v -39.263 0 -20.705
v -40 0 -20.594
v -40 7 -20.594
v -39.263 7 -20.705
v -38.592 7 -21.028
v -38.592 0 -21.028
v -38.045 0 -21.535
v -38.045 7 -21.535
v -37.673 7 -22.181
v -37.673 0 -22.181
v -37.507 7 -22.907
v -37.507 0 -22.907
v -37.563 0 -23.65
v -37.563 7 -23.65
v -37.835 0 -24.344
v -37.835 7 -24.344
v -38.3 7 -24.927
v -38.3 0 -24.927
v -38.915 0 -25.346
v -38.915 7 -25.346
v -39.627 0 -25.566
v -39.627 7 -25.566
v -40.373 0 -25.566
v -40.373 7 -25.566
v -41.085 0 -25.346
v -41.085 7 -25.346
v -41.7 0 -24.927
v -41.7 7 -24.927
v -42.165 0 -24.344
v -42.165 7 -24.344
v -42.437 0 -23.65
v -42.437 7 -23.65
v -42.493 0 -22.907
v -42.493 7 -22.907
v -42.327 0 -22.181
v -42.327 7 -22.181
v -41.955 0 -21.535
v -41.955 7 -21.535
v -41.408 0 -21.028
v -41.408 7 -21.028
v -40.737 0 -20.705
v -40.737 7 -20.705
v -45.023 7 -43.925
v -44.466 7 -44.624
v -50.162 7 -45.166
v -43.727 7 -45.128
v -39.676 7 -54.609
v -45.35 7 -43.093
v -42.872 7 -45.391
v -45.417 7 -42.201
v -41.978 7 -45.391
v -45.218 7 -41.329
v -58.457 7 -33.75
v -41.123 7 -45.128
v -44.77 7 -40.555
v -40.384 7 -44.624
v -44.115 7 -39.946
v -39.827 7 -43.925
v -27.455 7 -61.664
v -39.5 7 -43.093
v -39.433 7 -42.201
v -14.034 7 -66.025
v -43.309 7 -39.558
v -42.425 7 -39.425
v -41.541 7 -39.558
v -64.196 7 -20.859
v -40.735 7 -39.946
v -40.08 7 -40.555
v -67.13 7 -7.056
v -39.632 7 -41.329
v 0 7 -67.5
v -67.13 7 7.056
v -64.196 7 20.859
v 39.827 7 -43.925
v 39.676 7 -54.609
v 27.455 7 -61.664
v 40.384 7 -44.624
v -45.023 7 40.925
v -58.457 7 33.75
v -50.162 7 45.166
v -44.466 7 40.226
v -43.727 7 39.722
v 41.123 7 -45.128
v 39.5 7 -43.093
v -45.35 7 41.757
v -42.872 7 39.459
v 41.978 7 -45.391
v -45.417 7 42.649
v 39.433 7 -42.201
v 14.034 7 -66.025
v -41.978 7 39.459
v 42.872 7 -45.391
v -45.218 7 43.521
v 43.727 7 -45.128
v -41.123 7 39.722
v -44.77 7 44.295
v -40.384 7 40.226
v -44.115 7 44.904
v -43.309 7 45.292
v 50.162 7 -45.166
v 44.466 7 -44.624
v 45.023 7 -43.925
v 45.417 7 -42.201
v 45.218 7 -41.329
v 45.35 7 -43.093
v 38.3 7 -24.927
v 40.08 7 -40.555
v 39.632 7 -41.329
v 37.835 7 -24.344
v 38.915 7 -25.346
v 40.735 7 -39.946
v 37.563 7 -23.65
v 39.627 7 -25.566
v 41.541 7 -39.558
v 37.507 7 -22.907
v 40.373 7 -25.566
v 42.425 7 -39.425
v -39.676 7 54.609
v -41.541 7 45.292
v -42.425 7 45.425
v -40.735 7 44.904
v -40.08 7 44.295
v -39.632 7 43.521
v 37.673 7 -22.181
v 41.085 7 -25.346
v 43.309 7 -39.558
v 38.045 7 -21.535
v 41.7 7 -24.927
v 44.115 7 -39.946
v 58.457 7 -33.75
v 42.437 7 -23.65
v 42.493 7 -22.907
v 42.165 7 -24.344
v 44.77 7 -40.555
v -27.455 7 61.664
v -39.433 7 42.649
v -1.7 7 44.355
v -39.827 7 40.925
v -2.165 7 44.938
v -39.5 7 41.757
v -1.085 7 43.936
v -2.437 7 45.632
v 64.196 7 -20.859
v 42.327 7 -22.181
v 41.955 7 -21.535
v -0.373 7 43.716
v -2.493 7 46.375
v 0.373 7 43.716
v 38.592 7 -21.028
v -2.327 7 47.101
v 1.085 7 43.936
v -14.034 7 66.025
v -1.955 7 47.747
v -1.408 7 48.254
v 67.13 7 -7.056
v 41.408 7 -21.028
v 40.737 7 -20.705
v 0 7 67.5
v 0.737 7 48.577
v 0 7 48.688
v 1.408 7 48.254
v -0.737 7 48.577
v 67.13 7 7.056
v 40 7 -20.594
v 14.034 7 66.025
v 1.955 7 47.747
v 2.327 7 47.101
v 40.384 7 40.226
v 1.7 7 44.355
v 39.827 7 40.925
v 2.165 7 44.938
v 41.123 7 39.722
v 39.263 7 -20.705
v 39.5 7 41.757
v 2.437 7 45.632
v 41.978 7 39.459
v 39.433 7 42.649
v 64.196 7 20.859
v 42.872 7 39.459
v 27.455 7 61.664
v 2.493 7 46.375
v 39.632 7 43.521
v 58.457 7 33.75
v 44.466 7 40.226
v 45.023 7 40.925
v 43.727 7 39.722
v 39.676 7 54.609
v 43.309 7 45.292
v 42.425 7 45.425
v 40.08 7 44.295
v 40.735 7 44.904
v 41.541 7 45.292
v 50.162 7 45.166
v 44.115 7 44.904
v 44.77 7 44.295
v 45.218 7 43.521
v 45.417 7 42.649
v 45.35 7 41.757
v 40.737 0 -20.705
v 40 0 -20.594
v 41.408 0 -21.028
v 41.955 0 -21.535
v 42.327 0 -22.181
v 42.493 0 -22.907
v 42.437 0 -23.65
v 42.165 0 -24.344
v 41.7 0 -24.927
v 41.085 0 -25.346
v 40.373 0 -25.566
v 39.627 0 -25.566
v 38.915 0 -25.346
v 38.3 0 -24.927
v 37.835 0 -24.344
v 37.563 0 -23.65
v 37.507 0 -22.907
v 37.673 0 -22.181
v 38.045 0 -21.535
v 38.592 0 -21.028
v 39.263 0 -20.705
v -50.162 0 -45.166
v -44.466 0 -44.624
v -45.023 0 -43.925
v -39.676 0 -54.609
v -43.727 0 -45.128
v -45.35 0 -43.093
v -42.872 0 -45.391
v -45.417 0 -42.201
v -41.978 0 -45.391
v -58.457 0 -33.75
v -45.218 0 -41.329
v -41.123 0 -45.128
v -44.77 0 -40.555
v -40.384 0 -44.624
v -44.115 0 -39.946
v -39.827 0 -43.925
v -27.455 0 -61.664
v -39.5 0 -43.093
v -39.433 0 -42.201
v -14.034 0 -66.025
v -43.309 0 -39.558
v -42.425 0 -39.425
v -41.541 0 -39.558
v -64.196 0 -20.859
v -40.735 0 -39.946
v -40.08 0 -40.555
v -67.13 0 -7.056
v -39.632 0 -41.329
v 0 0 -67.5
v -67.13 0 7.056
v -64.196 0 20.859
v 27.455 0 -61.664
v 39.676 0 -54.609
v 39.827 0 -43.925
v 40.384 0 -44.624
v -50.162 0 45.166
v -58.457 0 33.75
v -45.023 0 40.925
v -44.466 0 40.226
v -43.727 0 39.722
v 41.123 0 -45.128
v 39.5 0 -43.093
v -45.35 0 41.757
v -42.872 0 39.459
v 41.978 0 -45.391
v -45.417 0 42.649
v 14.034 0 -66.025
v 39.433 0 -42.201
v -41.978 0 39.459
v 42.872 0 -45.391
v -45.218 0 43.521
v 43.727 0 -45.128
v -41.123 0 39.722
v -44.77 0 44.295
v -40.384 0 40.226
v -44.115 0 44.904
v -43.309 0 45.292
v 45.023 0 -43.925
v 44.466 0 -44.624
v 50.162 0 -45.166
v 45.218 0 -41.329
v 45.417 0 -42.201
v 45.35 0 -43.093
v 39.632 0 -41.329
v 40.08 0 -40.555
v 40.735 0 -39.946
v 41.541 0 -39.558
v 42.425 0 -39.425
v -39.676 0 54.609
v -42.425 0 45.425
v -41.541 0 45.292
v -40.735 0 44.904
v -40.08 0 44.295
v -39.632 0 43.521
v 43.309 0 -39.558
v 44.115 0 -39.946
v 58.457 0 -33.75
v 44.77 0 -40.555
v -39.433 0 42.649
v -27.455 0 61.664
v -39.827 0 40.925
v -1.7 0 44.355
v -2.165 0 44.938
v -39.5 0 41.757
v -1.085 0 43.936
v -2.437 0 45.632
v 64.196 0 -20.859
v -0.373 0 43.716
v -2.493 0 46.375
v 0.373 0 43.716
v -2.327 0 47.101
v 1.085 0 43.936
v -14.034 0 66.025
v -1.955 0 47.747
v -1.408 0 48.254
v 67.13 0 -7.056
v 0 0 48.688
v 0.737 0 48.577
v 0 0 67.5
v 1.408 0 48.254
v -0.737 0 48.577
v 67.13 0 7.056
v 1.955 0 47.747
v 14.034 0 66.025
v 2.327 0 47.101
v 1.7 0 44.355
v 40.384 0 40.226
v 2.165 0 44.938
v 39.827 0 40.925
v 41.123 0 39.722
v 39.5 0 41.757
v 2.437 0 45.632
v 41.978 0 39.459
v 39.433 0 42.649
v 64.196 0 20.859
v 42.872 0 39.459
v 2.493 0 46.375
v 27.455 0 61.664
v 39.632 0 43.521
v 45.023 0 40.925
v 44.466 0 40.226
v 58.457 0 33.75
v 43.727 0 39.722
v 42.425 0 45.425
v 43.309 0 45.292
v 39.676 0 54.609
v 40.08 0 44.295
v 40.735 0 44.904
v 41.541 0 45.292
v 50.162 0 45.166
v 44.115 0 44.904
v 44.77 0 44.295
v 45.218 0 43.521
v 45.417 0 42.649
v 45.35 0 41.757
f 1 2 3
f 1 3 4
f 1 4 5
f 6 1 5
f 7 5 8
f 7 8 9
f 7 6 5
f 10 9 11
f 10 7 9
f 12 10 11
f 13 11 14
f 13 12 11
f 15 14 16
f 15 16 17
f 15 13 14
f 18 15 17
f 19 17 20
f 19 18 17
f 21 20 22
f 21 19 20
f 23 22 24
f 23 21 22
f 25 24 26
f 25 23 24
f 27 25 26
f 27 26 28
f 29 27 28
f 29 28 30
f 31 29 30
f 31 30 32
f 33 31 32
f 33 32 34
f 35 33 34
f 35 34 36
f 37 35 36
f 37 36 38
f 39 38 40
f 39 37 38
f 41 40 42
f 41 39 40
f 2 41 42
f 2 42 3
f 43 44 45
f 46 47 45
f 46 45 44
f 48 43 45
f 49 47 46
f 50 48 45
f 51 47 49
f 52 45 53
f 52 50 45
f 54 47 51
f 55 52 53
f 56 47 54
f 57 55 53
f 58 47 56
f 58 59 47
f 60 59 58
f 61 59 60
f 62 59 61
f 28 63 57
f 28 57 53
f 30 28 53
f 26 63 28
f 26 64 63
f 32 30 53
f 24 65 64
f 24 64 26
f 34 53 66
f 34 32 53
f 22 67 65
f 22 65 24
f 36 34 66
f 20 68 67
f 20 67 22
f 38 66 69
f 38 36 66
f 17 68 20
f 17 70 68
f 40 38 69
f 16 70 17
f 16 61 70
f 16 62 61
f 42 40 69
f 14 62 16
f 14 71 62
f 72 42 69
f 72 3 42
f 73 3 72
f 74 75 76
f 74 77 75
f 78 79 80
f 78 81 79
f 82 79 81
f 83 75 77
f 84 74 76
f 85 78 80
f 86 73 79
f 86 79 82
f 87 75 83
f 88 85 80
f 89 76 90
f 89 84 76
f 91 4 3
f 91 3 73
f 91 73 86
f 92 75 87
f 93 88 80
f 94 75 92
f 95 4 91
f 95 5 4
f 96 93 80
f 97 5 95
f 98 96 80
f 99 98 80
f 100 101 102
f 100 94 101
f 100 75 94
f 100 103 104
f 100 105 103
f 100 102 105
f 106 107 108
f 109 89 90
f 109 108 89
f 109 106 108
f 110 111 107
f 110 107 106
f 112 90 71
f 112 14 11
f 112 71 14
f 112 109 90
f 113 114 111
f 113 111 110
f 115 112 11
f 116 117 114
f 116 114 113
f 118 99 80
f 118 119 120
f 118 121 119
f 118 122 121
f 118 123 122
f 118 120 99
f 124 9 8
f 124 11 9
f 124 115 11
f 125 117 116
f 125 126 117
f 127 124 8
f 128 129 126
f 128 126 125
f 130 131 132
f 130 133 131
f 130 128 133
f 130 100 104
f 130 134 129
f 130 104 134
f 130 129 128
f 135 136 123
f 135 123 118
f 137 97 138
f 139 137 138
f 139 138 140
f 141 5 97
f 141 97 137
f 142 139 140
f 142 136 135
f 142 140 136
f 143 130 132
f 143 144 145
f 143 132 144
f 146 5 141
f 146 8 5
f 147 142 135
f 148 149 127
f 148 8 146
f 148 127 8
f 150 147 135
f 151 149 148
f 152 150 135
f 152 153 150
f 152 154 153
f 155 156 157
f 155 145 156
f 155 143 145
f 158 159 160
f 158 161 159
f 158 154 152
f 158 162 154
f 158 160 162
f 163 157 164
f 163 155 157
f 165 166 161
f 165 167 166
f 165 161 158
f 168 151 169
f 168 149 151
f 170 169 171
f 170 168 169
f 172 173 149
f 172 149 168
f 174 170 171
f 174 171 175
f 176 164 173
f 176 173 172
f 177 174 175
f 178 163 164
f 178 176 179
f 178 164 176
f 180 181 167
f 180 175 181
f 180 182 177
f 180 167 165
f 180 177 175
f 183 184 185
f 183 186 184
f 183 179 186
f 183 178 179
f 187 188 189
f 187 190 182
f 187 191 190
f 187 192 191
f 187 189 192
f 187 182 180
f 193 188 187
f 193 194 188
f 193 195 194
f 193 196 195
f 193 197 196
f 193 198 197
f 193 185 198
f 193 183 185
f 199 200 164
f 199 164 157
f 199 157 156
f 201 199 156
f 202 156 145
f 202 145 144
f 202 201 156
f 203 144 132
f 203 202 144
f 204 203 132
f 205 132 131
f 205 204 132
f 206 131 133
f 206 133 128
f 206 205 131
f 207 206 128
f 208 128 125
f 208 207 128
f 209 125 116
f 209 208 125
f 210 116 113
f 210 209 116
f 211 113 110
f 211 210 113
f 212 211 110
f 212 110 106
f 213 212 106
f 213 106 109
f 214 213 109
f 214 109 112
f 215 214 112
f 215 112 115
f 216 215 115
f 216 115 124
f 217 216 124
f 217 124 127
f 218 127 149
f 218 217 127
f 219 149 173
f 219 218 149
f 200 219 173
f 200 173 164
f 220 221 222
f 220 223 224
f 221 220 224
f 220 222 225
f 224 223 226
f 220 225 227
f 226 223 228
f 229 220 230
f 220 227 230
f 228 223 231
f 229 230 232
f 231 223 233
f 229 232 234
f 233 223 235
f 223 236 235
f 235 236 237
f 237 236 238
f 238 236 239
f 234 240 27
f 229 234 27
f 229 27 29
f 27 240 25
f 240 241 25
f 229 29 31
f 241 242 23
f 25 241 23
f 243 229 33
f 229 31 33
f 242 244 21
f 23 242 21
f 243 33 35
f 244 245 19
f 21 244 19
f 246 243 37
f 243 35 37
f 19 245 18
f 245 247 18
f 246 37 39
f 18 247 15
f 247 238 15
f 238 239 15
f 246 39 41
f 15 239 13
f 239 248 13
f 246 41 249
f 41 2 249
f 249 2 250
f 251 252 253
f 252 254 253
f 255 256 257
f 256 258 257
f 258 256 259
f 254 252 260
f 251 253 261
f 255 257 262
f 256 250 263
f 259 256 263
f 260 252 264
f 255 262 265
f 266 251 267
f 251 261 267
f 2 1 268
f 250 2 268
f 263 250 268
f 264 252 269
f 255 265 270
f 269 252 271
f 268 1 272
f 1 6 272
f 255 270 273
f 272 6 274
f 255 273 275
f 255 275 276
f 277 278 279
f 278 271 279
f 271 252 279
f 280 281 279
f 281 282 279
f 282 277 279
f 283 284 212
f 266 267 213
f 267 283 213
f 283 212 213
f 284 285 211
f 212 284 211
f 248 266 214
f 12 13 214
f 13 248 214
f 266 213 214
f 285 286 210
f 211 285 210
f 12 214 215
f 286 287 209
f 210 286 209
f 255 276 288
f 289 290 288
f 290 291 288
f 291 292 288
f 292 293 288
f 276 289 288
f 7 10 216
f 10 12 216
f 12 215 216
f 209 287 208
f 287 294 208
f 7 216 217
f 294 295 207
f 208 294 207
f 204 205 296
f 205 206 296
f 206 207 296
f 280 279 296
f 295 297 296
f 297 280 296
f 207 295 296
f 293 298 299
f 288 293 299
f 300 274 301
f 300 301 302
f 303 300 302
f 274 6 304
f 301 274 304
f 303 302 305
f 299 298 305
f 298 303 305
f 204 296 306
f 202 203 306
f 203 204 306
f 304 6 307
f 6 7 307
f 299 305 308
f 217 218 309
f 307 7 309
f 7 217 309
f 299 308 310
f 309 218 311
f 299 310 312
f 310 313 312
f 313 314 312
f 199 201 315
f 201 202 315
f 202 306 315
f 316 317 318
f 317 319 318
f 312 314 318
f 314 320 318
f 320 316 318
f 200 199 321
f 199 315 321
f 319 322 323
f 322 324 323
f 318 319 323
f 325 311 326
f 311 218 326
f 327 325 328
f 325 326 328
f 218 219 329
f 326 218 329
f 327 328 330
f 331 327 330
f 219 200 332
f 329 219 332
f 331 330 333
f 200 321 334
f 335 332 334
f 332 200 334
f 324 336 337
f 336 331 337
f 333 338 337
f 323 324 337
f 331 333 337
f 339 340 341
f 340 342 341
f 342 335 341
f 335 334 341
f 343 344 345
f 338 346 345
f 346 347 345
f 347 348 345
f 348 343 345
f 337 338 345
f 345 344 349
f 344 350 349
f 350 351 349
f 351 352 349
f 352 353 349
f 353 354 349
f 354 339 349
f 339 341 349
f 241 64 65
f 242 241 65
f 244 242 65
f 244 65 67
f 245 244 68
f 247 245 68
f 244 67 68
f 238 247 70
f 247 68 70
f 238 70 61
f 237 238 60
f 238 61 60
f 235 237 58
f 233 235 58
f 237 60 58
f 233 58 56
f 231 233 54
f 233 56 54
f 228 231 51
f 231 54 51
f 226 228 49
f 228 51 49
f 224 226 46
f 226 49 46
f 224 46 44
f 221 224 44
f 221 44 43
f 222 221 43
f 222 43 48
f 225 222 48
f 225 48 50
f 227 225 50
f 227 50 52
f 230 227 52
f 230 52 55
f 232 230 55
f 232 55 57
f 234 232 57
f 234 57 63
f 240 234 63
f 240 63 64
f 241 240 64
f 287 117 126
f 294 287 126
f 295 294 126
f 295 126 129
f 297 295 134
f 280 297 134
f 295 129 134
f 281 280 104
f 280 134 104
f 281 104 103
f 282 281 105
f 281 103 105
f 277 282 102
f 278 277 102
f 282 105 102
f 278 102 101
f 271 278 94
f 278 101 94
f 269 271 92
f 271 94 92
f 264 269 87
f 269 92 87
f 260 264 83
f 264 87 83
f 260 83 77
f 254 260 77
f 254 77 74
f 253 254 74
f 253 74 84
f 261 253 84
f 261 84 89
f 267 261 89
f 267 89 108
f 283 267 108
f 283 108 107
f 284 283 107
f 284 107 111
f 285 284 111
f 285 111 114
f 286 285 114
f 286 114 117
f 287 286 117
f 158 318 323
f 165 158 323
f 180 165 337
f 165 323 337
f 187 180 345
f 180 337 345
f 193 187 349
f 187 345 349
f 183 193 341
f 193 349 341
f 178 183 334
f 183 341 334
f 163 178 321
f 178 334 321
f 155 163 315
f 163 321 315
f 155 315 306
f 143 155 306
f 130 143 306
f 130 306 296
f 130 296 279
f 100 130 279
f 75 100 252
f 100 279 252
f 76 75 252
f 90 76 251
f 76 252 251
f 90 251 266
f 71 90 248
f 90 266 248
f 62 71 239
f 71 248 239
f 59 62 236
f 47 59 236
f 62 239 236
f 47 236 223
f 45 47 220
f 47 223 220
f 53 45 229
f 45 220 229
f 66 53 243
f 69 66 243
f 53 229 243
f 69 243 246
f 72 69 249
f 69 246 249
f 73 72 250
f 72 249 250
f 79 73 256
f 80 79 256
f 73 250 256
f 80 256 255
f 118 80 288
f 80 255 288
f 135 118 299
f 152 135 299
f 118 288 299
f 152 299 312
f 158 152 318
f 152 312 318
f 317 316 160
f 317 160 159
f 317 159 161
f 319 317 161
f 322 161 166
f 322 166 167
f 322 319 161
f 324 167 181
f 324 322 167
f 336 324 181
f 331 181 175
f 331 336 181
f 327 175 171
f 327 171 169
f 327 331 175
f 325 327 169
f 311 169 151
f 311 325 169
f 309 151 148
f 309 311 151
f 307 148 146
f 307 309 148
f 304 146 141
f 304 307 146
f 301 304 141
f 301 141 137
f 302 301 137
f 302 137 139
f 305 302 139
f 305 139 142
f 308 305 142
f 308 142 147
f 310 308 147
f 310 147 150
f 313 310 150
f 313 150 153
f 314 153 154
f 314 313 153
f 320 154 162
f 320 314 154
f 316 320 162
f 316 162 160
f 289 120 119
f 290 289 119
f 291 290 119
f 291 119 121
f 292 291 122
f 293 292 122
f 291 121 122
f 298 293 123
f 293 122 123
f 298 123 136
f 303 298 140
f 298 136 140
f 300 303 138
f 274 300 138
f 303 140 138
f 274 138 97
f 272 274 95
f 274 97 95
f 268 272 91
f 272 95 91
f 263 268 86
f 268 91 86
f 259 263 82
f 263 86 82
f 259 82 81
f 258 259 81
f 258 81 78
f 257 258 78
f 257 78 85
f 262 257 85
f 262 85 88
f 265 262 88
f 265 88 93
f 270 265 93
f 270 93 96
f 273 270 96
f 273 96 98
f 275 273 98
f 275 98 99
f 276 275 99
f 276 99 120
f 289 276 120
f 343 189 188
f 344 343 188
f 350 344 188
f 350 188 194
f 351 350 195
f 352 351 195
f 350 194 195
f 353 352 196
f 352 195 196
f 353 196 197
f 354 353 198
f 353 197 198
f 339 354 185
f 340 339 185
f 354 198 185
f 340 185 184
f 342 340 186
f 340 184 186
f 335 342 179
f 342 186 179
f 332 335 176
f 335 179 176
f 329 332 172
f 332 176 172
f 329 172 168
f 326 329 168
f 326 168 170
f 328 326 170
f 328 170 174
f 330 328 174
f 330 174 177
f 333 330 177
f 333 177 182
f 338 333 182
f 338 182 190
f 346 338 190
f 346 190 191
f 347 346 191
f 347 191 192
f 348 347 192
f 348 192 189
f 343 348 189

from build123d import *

# Parameters (mm, degrees)
SKETCH1_R           = 67.5
SKETCH1_R_2         = 2.5
BOSS_EXTRUDE1_DEPTH = 7
SKETCH3_R           = 3
CUT_EXTRUDE1_DEPTH  = 10


with BuildPart() as part:
    # Sketch1 → Boss-Extrude1 (new body)
    with BuildSketch(Plane(origin=(0, 0, 0), x_dir=(1, 0, 0), z_dir=(0, 1, 0))):
        with Locations(Location((0, 0, 0), (0, 0, 270))):
            Circle(SKETCH1_R)
        with Locations(Location((-40, 23.094010768, 0), (0, 0, 270))):
            Circle(SKETCH1_R_2, mode=Mode.SUBTRACT)
        with Locations(Location((40, 23.094010768, 0), (0, 0, 270))):
            Circle(SKETCH1_R_2, mode=Mode.SUBTRACT)
        with Locations(Location((0, -46.188021535, 0), (0, 0, 270))):
            Circle(SKETCH1_R_2, mode=Mode.SUBTRACT)
    extrude(amount=BOSS_EXTRUDE1_DEPTH)

    # Sketch3 → Cut-Extrude1 (cut)
    with BuildSketch(Plane(origin=(0, 7, 0), x_dir=(1, 0, 0), z_dir=(0, 1, 0))):
        with Locations(Location((42.425, 42.425, 0), (0, 0, 270))):
            Circle(SKETCH3_R)
        with Locations(Location((42.425, -42.425, 0), (0, 0, 270))):
            Circle(SKETCH3_R)
        with Locations(Location((-42.425, -42.425, 0), (0, 0, 270))):
            Circle(SKETCH3_R)
        with Locations(Location((-42.425, 42.425, 0), (0, 0, 270))):
            Circle(SKETCH3_R)
    extrude(amount=-CUT_EXTRUDE1_DEPTH, mode=Mode.SUBTRACT)


solid = part.part
